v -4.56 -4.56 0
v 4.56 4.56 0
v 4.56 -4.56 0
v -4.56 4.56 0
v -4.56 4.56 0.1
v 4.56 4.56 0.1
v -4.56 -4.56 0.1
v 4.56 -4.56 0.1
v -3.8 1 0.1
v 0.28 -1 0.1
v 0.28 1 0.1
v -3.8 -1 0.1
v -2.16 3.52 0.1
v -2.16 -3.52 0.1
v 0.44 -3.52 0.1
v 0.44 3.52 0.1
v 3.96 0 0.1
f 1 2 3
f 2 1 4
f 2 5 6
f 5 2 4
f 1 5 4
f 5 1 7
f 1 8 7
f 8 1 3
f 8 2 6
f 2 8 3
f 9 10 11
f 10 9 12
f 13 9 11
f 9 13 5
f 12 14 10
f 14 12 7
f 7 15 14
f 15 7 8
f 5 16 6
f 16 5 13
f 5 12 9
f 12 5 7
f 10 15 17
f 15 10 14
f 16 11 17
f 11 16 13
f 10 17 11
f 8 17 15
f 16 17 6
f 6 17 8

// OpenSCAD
// file: ../p/box5-12.scad
use <../lib.scad>
function ldraw_lib__box5_12() = [
// 0 Box with 5 Faces without Any Edges
// 0 Name: box5-12.dat
// 0 Author: Chris Dee [cwdee]
// 0 !LDRAW_ORG Primitive UPDATE 2009-02
// 0 !LICENSE Licensed under CC BY 2.0 and CC BY 4.0 : see CAreadme.txt
// 
// 0 BFC CERTIFY CCW
  [0,"BFC","CERTIFY"],
  [0,"BFC","CCW"],
// 
// 0 !HISTORY 2009-09-03 [PTadmin] Official Update 2009-02
// 
// 
// 4 16 1 1 1 1 1 -1 -1 1 -1 -1 1 1
  [4,16,1,1,1,1,1,-1,-1,1,-1,-1,1,1],
// 4 16 -1 0 1 1 0 1 1 1 1 -1 1 1
  [4,16,-1,0,1,1,0,1,1,1,1,-1,1,1],
// 4 16 -1 0 -1 -1 0 1 -1 1 1 -1 1 -1
  [4,16,-1,0,-1,-1,0,1,-1,1,1,-1,1,-1],
// 4 16 1 0 -1 -1 0 -1 -1 1 -1 1 1 -1
  [4,16,1,0,-1,-1,0,-1,-1,1,-1,1,1,-1],
// 4 16 1 0 1 1 0 -1 1 1 -1 1 1 1
  [4,16,1,0,1,1,0,-1,1,1,-1,1,1,1],
// 0
];
makepoly(ldraw_lib__box5_12(), line=0.2);
// main file
use <../lib.scad>
use <../p/box5-12.scad>
function ldraw_lib__004589b() = [
// 0 Sticker  1.1 x  1.1 with Black Arrow on White Background
// 0 Name: 004589b.dat
// 0 Author: Alex Taylor [anathema]
// 0 !LDRAW_ORG Part UPDATE 2022-01
// 0 !LICENSE Licensed under CC BY 2.0 and CC BY 4.0 : see CAreadme.txt
// 
// 0 BFC CERTIFY CCW
  [0,"BFC","CERTIFY"],
  [0,"BFC","CCW"],
// 
// 0 !KEYWORDS Set 148
// 
// 0 !HISTORY 2022-01-14 [PTadmin] Official Update 2022-01
// 
// 
// 1 16 0 -0.25 0 11.4 0 0 0 0.25 0 0 0 11.4 box5-12.dat
  [1,16,0,-0.25,0,11.4,0,0,0,0.25,0,0,0,11.4, ldraw_lib__box5_12()],
// 4 0 -9.5 -0.25 -2.5 0.7 -0.25 -2.5 0.7 -0.25 2.5 -9.5 -0.25 2.5
  [4,0,-9.5,-0.25,-2.5,0.7,-0.25,-2.5,0.7,-0.25,2.5,-9.5,-0.25,2.5],
// 4 15 -9.5 -0.25 2.5 0.7 -0.25 2.5 -5.4 -0.25 8.8 -11.4 -0.25 11.4
  [4,15,-9.5,-0.25,2.5,0.7,-0.25,2.5,-5.4,-0.25,8.8,-11.4,-0.25,11.4],
// 4 15 -11.4 -0.25 -11.4 -5.4 -0.25 -8.8 0.7 -0.25 -2.5 -9.5 -0.25 -2.5
  [4,15,-11.4,-0.25,-11.4,-5.4,-0.25,-8.8,0.7,-0.25,-2.5,-9.5,-0.25,-2.5],
// 4 15 11.4 -0.25 -11.4 1.1 -0.25 -8.8 -5.4 -0.25 -8.8 -11.4 -0.25 -11.4
  [4,15,11.4,-0.25,-11.4,1.1,-0.25,-8.8,-5.4,-0.25,-8.8,-11.4,-0.25,-11.4],
// 4 15 -11.4 -0.25 11.4 -5.4 -0.25 8.8 1.1 -0.25 8.8 11.4 -0.25 11.4
  [4,15,-11.4,-0.25,11.4,-5.4,-0.25,8.8,1.1,-0.25,8.8,11.4,-0.25,11.4],
// 4 15 -9.5 -0.25 -2.5 -9.5 -0.25 2.5 -11.4 -0.25 11.4 -11.4 -0.25 -11.4
  [4,15,-9.5,-0.25,-2.5,-9.5,-0.25,2.5,-11.4,-0.25,11.4,-11.4,-0.25,-11.4],
// 4 0 9.9 -0.25 0 0.7 -0.25 -2.5 -5.4 -0.25 -8.8 1.1 -0.25 -8.8
  [4,0,9.9,-0.25,0,0.7,-0.25,-2.5,-5.4,-0.25,-8.8,1.1,-0.25,-8.8],
// 4 0 1.1 -0.25 8.8 -5.4 -0.25 8.8 0.7 -0.25 2.5 9.9 -0.25 0
  [4,0,1.1,-0.25,8.8,-5.4,-0.25,8.8,0.7,-0.25,2.5,9.9,-0.25,0],
// 3 0 0.7 -0.25 -2.5 9.9 -0.25 0 0.7 -0.25 2.5
  [3,0,0.7,-0.25,-2.5,9.9,-0.25,0,0.7,-0.25,2.5],
// 3 15 11.4 -0.25 -11.4 9.9 -0.25 0 1.1 -0.25 -8.8
  [3,15,11.4,-0.25,-11.4,9.9,-0.25,0,1.1,-0.25,-8.8],
// 3 15 1.1 -0.25 8.8 9.9 -0.25 0 11.4 -0.25 11.4
  [3,15,1.1,-0.25,8.8,9.9,-0.25,0,11.4,-0.25,11.4],
// 3 15 11.4 -0.25 11.4 9.9 -0.25 0 11.4 -0.25 -11.4
  [3,15,11.4,-0.25,11.4,9.9,-0.25,0,11.4,-0.25,-11.4],
];
makepoly(ldraw_lib__004589b(), line=0.2);
